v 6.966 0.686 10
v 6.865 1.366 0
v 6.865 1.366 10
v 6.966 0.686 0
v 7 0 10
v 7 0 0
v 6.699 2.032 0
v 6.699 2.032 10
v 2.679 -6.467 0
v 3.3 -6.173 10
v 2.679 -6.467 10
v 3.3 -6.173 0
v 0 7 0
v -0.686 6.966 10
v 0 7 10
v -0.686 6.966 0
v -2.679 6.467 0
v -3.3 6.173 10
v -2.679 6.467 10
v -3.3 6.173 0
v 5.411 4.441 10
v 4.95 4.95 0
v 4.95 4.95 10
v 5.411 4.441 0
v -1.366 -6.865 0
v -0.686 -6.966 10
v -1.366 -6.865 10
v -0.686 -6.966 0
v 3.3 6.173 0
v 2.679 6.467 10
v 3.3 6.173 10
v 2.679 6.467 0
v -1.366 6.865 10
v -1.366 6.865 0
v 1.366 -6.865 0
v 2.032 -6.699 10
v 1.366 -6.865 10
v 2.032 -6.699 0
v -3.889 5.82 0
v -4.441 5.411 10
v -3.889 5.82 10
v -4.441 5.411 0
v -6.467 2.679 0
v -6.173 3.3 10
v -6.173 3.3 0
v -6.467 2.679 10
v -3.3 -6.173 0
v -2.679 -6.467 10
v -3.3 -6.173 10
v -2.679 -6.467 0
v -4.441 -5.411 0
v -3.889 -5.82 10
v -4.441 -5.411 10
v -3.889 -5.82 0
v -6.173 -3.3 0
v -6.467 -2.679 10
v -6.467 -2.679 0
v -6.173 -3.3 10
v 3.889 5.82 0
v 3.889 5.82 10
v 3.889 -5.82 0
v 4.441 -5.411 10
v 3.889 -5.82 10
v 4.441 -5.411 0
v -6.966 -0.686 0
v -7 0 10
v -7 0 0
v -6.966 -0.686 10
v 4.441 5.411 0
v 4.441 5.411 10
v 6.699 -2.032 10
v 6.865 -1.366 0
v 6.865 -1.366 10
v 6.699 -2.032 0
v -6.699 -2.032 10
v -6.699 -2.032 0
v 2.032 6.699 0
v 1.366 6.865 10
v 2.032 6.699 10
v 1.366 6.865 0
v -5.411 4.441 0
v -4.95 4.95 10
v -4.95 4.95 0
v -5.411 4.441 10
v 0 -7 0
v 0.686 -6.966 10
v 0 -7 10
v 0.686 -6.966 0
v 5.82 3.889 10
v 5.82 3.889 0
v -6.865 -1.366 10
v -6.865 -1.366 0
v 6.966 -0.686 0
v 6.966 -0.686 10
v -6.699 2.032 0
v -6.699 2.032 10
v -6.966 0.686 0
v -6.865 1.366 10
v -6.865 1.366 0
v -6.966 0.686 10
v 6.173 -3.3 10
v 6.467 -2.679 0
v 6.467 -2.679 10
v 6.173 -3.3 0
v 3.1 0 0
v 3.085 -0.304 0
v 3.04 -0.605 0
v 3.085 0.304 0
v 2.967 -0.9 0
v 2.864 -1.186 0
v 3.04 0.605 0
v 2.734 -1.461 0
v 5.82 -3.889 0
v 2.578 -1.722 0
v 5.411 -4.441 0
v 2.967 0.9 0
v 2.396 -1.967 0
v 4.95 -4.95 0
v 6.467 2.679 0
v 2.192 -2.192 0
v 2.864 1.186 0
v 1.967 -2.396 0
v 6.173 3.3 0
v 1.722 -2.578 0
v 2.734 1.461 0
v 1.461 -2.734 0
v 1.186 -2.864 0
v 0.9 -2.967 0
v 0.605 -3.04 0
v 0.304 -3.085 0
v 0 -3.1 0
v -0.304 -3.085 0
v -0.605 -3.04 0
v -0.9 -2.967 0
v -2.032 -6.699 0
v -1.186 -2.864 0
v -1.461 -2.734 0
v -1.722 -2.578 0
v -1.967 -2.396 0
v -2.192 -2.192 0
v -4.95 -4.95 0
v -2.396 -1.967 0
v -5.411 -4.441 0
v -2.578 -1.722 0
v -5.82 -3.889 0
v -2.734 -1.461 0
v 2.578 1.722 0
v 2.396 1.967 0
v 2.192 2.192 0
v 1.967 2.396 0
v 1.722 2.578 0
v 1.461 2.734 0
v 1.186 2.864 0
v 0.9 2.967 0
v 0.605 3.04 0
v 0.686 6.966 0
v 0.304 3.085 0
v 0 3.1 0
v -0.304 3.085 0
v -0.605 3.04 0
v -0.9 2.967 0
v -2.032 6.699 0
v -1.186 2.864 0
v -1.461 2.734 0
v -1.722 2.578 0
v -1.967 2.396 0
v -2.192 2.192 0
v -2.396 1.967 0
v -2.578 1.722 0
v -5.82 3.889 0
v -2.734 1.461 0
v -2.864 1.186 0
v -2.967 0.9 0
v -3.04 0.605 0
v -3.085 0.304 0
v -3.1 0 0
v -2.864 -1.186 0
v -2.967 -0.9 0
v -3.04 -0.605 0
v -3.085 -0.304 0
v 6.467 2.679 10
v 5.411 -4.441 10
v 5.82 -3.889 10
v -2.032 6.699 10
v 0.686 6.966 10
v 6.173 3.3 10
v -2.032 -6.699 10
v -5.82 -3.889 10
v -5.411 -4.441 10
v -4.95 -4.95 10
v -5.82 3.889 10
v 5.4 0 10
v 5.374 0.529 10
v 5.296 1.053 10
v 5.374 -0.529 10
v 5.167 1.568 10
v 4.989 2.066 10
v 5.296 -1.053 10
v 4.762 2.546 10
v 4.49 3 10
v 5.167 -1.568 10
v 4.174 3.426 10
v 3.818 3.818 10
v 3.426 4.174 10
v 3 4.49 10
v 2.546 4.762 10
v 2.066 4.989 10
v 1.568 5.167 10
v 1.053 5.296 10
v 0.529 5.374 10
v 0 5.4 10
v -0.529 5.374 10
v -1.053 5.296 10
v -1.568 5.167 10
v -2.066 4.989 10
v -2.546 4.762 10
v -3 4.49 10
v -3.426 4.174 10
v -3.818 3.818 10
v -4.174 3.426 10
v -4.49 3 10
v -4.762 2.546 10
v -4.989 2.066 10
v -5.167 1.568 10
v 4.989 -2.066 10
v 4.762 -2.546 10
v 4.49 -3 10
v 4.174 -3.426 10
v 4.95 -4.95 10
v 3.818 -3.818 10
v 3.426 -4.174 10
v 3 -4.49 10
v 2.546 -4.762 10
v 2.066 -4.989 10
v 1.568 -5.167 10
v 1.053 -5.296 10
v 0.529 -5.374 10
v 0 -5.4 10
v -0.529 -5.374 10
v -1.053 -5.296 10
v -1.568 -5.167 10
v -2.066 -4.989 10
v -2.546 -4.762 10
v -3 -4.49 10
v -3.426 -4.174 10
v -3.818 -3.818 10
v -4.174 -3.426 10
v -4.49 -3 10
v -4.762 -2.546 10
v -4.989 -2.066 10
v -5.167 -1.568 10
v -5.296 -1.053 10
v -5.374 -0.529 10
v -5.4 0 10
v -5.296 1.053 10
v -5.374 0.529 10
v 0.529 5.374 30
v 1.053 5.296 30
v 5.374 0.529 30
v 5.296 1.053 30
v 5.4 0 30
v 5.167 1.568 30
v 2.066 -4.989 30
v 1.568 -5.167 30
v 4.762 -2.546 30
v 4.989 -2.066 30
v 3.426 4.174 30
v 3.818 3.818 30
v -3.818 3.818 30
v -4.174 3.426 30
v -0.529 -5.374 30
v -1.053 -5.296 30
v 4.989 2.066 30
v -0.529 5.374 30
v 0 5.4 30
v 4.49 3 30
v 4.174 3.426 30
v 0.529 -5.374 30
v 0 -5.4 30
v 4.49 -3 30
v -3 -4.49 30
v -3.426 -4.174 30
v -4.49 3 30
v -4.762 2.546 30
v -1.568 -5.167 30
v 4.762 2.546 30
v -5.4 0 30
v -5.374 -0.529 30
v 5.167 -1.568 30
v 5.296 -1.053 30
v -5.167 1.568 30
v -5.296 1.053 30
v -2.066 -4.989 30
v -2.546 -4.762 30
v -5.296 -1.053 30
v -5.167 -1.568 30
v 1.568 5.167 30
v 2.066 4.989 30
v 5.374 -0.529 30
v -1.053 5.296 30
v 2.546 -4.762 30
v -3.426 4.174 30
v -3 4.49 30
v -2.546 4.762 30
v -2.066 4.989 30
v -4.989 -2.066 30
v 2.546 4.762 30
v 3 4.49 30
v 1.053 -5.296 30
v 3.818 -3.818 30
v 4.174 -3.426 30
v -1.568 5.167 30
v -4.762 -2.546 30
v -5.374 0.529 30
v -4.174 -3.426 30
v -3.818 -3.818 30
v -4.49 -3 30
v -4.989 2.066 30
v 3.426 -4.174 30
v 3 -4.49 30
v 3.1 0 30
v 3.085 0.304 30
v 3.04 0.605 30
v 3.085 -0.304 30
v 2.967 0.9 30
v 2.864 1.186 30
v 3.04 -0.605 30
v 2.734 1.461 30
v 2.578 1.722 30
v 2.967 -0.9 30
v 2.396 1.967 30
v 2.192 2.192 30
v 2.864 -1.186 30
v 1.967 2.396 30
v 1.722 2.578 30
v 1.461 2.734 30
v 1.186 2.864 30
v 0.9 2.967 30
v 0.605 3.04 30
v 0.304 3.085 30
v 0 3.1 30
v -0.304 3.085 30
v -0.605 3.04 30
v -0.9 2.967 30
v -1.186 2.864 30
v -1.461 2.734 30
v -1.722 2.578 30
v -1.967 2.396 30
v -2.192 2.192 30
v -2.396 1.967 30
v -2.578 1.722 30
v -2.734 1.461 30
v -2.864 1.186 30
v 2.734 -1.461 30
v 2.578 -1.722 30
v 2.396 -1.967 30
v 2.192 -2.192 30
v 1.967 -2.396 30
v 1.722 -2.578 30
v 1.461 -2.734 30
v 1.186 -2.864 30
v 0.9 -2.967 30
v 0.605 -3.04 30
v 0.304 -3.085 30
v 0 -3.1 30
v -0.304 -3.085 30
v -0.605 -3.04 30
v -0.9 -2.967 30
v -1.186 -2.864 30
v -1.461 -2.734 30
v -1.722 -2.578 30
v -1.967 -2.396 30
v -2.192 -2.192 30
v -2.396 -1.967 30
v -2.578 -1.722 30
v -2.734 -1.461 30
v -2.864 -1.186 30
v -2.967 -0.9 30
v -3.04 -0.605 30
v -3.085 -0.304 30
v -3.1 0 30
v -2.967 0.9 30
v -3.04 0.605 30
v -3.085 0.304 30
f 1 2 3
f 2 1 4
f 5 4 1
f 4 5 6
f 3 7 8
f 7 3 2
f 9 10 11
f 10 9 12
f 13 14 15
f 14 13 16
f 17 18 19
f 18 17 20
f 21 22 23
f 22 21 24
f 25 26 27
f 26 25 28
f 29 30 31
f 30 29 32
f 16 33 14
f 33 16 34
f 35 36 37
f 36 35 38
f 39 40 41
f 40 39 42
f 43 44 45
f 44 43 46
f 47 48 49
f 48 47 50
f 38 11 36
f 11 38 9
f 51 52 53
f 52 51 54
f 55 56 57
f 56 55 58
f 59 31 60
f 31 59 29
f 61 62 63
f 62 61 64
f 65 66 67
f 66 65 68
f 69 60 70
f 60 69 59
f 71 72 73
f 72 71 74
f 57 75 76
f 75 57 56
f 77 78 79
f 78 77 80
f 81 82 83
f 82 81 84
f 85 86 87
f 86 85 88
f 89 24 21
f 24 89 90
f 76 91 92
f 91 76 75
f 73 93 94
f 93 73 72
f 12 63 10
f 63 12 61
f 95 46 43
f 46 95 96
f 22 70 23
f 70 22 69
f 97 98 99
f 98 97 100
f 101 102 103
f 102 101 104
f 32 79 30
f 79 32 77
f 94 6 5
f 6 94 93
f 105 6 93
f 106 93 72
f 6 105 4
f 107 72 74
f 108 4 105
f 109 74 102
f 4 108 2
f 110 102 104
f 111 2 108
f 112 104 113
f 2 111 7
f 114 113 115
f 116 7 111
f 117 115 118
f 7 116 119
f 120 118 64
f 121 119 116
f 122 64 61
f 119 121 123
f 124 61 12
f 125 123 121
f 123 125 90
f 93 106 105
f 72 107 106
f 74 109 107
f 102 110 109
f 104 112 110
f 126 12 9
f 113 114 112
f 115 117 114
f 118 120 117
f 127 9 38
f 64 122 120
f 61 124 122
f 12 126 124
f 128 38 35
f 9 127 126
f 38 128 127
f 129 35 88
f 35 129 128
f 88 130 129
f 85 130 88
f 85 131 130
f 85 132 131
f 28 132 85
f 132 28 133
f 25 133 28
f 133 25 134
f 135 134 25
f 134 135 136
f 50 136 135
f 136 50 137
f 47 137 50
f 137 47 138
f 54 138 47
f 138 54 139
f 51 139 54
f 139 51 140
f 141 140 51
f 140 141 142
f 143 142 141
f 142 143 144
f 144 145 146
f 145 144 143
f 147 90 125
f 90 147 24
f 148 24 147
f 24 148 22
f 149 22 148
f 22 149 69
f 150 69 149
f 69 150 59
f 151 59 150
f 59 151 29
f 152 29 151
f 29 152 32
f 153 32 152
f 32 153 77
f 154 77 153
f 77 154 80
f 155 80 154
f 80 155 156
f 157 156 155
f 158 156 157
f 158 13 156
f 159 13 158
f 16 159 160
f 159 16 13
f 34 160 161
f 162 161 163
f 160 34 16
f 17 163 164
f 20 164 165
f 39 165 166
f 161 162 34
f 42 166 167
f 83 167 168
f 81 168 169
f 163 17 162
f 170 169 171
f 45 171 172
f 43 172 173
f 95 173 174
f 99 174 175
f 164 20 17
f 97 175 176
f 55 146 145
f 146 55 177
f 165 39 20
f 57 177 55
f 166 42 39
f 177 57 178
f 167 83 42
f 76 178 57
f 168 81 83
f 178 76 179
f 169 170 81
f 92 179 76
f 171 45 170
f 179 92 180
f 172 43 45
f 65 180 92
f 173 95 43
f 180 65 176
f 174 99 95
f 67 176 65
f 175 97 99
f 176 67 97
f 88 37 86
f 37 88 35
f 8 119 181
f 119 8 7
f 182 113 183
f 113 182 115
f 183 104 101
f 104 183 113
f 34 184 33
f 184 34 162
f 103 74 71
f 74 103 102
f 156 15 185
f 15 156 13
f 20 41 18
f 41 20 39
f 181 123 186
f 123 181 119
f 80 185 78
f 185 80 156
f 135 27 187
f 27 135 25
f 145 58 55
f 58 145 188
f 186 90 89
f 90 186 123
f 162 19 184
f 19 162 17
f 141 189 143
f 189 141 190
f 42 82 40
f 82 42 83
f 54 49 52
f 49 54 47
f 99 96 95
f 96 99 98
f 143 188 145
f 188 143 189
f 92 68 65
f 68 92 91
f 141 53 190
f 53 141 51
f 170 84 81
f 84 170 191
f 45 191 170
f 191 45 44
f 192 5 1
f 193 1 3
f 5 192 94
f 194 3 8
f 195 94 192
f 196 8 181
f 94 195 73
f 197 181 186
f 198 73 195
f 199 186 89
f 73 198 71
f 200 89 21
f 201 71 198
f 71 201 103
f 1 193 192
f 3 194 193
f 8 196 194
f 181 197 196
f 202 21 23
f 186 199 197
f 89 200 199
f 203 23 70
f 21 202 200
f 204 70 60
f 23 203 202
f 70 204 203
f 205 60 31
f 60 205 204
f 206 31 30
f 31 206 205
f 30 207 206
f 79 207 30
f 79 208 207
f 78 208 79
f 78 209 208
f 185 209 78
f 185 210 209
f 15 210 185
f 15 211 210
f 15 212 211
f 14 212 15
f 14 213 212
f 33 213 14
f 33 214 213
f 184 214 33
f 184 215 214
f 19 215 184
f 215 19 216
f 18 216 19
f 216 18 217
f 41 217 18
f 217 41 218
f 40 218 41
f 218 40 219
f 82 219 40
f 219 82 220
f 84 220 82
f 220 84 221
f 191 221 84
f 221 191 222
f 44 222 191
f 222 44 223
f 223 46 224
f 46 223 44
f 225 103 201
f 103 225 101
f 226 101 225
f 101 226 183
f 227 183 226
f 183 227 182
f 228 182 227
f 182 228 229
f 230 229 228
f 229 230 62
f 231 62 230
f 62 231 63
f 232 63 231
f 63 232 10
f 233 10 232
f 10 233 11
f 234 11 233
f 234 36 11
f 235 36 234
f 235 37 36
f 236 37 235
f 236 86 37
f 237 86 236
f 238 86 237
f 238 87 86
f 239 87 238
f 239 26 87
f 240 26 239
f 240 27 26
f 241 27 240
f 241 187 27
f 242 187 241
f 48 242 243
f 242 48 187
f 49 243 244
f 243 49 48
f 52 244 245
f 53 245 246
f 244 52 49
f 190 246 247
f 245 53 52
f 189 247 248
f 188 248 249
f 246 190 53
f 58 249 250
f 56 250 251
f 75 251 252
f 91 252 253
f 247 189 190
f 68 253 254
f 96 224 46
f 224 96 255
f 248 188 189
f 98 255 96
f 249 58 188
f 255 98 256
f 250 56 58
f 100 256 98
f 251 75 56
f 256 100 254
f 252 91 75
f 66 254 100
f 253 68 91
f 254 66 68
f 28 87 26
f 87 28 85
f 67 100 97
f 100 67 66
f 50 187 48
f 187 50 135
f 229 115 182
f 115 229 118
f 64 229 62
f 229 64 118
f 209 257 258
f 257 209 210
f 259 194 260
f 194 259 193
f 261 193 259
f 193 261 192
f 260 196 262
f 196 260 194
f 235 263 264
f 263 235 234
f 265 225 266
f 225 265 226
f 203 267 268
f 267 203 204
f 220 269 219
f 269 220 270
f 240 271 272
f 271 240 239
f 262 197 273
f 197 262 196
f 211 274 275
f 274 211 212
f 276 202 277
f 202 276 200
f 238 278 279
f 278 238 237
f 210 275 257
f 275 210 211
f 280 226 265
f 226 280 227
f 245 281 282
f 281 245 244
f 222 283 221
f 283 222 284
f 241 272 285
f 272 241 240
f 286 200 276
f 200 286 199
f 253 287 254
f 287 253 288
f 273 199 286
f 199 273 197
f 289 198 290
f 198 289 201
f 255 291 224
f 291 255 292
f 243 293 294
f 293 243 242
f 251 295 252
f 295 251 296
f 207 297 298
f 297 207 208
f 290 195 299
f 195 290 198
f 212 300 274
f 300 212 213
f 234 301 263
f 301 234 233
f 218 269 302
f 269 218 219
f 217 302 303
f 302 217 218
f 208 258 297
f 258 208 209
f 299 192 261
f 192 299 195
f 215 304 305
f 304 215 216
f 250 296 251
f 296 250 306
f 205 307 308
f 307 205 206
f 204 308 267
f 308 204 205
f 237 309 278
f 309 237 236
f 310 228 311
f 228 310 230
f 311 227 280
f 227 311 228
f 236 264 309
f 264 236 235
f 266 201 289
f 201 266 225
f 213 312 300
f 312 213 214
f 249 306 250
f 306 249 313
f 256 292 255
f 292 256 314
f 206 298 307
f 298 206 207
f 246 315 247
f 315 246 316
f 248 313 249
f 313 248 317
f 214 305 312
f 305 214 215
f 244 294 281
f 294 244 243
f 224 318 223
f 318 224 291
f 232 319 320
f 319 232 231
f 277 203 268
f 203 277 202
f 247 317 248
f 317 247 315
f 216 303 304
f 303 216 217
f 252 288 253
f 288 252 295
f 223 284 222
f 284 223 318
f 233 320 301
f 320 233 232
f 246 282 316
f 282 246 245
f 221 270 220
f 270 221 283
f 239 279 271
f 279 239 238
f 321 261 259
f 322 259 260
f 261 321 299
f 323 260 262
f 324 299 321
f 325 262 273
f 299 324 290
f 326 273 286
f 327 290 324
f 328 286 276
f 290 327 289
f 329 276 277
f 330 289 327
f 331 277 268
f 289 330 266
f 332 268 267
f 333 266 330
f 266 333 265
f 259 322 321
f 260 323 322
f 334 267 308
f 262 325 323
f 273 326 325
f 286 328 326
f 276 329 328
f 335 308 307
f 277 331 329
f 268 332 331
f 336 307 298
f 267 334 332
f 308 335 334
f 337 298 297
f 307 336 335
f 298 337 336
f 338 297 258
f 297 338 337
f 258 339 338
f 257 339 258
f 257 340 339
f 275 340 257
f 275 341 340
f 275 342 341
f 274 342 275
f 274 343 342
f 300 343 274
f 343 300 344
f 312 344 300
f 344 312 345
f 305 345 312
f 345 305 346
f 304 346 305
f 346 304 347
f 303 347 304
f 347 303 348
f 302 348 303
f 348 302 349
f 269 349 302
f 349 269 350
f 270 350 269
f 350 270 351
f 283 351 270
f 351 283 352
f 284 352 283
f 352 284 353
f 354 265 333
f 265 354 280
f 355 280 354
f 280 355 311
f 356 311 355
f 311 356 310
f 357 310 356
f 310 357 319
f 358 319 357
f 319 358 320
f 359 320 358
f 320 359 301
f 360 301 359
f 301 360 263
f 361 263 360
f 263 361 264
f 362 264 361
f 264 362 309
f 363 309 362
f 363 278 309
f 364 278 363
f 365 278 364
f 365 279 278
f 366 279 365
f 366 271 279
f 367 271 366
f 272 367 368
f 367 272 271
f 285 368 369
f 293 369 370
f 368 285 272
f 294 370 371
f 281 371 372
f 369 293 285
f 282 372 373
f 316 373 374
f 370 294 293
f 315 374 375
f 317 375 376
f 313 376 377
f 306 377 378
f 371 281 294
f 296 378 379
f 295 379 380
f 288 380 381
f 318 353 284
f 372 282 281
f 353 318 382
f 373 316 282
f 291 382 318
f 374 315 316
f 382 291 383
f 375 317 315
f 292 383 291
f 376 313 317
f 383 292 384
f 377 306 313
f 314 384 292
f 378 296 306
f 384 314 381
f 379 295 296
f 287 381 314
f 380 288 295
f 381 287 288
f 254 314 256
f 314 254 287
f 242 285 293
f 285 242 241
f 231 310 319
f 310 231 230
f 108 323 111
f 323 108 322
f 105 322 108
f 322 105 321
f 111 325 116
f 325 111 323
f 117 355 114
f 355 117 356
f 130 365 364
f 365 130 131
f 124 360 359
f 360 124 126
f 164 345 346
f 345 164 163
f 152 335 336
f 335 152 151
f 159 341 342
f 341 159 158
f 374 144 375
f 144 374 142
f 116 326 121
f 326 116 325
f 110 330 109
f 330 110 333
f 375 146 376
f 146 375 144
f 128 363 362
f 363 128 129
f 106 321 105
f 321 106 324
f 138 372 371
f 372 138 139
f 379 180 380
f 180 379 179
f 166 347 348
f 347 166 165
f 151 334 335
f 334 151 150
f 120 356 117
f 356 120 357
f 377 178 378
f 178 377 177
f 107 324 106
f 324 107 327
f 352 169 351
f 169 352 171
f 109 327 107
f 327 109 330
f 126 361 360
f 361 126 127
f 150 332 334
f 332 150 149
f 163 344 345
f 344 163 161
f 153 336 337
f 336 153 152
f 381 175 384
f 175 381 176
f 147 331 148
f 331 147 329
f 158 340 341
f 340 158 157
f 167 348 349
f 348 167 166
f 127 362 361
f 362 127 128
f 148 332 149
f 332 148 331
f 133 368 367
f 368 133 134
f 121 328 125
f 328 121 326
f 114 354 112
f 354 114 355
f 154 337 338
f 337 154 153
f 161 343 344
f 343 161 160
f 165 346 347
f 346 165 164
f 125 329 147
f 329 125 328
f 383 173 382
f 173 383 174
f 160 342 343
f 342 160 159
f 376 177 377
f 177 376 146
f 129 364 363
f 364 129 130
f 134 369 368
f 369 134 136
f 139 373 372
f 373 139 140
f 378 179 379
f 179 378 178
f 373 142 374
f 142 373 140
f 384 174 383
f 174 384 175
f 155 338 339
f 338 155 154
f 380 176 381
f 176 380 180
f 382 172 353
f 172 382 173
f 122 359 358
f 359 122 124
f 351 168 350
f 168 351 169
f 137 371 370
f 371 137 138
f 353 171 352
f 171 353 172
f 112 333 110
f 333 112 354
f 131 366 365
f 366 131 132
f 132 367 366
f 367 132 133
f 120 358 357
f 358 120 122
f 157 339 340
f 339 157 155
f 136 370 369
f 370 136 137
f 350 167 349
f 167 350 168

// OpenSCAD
// Stepped tube adapter - two coaxial tube sections of different diameter joined at a shoulder and
// bored through, to couple two tube sizes. NOVEL general part (a generic reducer).
//
// @desc hollow stepped adapter joining two tube diameters
// @prompt Design a stepped tube adapter in OpenSCAD: a section {d1} mm across and {l1} mm long joined to a section {d2} mm across and {l2} mm long, bored through with a {bore} mm hole. Reply with a single complete OpenSCAD file.
// @param d1   first outer diameter, mm   [14:34]
// @param l1   first length, mm           [10:30]
// @param d2   second outer diameter, mm  [8:24]
// @param l2   second length, mm          [10:30]
// @param bore through-bore diameter, mm  [4:16]

d1   = 14;
l1   = 10;
d2   = 10.8;
l2   = 20;
bore = 6.2;

$fn = 64;

b = min(bore, d2 - 2, d1 - 2);        // keep a wall in the narrower section

difference() {
    union() {
        cylinder(h = l1, d = d1);
        translate([0, 0, l1 - 0.01]) cylinder(h = l2 + 0.01, d = d2);
    }
    translate([0, 0, -1]) cylinder(h = l1 + l2 + 2, d = b);   // through-bore
}
